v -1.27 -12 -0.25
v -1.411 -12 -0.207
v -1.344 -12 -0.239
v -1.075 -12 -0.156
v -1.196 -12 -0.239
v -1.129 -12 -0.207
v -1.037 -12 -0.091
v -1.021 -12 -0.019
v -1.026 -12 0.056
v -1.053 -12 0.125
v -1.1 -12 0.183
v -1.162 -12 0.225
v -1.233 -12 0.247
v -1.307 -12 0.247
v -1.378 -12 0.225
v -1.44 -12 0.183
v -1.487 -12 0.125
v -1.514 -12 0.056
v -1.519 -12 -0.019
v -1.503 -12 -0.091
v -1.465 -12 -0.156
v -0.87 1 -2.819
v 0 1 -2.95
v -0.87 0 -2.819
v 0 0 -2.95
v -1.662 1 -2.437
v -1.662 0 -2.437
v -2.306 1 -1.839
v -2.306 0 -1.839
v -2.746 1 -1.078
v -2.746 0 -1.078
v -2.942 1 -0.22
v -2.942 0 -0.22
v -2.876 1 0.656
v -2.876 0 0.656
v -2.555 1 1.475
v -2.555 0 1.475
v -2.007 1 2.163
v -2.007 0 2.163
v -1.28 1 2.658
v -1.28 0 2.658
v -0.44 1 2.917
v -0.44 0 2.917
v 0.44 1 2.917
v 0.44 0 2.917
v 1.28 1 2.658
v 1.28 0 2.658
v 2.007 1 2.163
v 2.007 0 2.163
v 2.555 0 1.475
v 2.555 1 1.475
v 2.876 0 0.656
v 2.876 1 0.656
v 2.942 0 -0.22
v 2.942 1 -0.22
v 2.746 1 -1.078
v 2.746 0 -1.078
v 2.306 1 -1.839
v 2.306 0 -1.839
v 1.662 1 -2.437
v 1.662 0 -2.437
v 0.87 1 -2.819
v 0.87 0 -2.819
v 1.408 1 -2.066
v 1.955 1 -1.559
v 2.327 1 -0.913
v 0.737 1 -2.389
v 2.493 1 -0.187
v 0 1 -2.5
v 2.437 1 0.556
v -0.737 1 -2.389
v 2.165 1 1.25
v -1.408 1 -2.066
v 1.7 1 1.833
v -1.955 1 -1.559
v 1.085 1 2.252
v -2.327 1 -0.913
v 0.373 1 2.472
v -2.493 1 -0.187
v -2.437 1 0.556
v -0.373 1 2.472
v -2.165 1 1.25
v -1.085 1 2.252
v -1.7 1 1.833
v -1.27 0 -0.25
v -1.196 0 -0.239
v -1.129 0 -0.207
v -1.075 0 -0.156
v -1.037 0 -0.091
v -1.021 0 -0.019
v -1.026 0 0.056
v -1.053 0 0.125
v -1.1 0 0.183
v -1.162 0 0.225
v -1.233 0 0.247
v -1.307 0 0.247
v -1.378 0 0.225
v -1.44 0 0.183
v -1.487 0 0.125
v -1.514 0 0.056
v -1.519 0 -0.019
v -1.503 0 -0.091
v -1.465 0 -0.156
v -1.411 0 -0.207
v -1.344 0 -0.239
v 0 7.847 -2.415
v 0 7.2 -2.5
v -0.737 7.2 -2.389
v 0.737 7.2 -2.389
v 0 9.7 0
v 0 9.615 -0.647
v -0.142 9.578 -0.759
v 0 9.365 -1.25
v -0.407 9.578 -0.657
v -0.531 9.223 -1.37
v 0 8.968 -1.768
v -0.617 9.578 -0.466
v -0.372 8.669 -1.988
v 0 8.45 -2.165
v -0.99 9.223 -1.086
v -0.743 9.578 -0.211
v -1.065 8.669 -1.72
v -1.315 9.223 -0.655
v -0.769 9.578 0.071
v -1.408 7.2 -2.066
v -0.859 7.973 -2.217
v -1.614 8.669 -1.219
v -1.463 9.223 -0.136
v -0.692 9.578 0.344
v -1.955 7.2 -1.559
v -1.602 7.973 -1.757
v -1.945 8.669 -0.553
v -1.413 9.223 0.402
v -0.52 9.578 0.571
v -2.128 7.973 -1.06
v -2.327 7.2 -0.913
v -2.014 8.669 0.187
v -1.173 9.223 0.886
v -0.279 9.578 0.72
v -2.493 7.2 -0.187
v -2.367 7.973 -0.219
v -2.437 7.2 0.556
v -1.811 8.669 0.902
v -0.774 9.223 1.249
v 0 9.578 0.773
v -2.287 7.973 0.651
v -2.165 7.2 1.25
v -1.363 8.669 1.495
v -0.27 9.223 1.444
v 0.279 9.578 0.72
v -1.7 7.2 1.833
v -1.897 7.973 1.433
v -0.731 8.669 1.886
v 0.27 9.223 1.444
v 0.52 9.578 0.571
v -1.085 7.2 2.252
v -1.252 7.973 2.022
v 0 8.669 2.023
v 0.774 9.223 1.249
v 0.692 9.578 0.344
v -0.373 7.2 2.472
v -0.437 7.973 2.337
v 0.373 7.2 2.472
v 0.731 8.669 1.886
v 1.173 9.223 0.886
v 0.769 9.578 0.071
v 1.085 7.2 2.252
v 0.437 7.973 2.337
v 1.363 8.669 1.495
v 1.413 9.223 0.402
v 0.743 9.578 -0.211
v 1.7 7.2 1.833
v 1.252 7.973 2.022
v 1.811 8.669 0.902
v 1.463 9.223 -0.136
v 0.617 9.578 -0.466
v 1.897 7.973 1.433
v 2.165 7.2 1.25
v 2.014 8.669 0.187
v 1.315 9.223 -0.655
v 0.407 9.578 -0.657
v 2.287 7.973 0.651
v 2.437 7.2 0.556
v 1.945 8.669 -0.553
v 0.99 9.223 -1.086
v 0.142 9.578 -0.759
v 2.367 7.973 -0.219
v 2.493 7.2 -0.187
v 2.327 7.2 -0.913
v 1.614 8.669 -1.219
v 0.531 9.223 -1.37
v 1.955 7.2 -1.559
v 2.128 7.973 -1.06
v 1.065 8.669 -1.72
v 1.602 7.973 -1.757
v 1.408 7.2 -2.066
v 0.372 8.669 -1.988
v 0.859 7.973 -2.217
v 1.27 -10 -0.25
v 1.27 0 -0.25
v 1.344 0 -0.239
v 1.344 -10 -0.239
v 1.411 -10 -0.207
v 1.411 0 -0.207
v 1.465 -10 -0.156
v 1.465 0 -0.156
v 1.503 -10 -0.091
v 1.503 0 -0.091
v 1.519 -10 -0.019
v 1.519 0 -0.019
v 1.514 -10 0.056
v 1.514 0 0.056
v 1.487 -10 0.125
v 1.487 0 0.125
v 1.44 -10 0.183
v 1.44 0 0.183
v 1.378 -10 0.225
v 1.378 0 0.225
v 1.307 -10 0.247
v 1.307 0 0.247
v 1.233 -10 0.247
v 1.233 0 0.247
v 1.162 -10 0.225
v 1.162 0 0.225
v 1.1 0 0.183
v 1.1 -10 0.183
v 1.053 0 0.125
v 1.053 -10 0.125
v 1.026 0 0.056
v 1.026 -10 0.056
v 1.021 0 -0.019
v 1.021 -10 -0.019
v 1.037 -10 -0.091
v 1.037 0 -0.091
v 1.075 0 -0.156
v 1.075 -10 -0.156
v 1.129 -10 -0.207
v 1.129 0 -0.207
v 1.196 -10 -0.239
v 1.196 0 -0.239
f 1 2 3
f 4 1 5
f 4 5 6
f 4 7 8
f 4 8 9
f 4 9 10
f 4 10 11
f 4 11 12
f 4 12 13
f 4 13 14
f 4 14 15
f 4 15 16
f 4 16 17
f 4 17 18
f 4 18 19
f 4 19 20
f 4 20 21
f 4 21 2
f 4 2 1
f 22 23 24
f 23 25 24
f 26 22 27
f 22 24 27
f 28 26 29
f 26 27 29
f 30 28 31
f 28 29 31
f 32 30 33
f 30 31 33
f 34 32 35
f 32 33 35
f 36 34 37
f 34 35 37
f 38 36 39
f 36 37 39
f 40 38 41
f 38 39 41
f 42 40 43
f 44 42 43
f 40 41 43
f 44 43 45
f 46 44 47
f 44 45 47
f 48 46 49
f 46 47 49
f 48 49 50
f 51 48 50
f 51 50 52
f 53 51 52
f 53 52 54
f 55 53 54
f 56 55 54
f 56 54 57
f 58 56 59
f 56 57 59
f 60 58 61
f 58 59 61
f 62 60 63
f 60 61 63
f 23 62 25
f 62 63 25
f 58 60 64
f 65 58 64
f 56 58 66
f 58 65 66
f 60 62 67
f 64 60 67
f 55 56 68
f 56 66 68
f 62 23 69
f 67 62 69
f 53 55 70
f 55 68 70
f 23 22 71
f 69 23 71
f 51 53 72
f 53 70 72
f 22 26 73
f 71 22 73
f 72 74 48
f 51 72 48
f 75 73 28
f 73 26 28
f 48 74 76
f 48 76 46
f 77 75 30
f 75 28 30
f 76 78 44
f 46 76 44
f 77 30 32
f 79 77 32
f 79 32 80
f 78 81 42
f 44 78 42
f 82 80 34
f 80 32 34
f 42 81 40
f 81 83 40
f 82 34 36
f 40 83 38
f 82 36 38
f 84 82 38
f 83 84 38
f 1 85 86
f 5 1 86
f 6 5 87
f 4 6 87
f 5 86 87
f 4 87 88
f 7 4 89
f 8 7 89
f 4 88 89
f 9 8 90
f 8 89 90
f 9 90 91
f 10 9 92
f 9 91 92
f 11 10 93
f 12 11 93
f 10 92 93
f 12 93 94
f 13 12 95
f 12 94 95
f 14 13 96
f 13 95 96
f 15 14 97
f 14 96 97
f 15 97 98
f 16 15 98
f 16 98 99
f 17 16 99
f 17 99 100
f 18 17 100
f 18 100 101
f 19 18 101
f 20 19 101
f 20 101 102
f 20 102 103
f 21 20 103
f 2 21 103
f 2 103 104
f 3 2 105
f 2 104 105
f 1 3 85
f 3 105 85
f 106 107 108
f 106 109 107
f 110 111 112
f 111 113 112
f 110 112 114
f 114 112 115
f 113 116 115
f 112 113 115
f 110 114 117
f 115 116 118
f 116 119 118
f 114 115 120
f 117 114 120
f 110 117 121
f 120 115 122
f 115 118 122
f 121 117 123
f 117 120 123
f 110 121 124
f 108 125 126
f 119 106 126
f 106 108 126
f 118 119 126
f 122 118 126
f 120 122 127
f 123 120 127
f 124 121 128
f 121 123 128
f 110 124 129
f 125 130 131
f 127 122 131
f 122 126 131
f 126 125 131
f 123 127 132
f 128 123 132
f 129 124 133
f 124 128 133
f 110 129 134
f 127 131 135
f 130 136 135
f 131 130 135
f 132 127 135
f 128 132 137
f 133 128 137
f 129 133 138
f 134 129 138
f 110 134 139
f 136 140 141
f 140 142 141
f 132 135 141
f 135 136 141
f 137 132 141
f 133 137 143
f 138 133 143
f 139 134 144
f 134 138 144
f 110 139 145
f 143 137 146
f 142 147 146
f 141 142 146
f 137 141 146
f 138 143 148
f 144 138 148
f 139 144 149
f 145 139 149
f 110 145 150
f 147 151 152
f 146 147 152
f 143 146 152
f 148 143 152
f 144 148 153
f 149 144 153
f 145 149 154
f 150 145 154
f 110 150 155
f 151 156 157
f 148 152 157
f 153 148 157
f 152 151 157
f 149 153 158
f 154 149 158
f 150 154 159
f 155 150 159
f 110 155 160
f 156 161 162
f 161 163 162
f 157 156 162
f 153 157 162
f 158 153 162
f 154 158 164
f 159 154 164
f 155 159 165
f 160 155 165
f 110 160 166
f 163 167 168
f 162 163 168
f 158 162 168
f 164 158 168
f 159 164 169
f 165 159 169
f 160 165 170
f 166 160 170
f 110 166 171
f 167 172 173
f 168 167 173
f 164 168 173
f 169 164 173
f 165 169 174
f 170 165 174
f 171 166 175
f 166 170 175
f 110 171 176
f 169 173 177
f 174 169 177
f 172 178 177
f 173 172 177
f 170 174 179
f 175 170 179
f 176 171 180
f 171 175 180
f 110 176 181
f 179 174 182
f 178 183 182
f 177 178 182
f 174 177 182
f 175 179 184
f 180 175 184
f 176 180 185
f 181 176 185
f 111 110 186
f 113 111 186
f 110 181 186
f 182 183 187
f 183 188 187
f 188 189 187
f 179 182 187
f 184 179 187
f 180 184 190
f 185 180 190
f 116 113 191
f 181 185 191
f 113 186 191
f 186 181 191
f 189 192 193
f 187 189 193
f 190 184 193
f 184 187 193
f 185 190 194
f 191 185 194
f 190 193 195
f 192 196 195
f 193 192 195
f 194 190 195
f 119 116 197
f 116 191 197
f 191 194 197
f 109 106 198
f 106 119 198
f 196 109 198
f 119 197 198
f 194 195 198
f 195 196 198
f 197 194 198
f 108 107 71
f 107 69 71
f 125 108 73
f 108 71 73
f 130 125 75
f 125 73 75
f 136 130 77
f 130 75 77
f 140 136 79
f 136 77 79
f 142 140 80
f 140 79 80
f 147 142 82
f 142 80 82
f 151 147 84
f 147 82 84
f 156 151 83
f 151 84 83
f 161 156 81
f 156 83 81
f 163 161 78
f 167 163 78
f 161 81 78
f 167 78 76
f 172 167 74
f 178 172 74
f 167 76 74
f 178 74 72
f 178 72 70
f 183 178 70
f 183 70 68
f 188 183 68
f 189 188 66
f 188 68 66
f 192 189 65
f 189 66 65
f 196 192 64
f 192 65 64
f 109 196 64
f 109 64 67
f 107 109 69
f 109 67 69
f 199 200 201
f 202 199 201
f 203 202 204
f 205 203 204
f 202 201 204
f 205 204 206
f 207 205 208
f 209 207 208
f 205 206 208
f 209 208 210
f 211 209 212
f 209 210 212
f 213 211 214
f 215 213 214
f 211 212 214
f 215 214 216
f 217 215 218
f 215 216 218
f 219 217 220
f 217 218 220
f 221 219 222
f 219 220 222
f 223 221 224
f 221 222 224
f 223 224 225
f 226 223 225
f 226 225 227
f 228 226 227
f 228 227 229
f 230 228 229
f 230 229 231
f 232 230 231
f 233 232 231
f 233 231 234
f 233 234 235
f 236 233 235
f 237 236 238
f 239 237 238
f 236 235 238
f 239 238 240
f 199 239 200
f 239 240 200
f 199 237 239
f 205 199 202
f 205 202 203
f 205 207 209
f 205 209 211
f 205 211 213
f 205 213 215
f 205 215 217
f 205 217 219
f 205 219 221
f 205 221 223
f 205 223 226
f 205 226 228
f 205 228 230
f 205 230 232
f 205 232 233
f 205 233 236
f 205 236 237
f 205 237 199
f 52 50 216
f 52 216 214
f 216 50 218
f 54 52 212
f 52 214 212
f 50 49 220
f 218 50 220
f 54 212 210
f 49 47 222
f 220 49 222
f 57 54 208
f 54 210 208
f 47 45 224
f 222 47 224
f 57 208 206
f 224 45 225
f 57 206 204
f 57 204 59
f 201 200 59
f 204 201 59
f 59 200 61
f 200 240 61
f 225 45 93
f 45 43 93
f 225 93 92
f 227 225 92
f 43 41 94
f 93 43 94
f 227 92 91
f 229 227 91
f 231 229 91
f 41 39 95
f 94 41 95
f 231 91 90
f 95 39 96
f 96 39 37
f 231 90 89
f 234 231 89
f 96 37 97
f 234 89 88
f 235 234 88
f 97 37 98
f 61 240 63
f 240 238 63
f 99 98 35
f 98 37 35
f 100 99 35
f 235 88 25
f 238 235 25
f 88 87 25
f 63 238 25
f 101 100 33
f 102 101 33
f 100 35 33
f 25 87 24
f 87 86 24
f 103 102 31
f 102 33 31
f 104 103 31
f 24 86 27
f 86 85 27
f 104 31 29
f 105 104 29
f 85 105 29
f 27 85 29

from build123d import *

# Parameters (mm, degrees)
SKETCH2_R           = 0.25
BOSS_EXTRUDE1_DEPTH = 10
SKETCH3_R           = 0.25
BOSS_EXTRUDE2_DEPTH = 12


with BuildPart() as part:
    # Sketch1 → Revolve1 (revolve)
    with BuildSketch(Plane.XY, mode=Mode.PRIVATE) as revolve1_sk:
        with BuildLine():
            Line((0, 0), (0, 9.7))
            ThreePointArc((0, 9.7), (1.767766953, 8.967766953), (2.5, 7.2))
            Line((2.5, 7.2), (2.5, 1))
            Line((2.5, 1), (2.95, 1))
            Line((2.95, 1), (2.95, 0))
            Line((2.95, 0), (0, 0))
        make_face()
    revolve(revolve1_sk.sketch.rotate(Axis((0, 0, 0), (0, 1, 0)), 90), axis=Axis((0, 0, 0), (0, 1, 0)))

    # Sketch2 → Boss-Extrude1 (add)
    with BuildSketch(Plane.XZ):
        with Locations(Location((1.27, 0, 0), (0, 0, 270))):
            Circle(SKETCH2_R)
    extrude(amount=BOSS_EXTRUDE1_DEPTH)

    # Sketch3 → Boss-Extrude2 (add)
    with BuildSketch(Plane.XZ):
        with Locations(Location((-1.27, 0, 0), (0, 0, 270))):
            Circle(SKETCH3_R)
    extrude(amount=BOSS_EXTRUDE2_DEPTH)


solid = part.part
